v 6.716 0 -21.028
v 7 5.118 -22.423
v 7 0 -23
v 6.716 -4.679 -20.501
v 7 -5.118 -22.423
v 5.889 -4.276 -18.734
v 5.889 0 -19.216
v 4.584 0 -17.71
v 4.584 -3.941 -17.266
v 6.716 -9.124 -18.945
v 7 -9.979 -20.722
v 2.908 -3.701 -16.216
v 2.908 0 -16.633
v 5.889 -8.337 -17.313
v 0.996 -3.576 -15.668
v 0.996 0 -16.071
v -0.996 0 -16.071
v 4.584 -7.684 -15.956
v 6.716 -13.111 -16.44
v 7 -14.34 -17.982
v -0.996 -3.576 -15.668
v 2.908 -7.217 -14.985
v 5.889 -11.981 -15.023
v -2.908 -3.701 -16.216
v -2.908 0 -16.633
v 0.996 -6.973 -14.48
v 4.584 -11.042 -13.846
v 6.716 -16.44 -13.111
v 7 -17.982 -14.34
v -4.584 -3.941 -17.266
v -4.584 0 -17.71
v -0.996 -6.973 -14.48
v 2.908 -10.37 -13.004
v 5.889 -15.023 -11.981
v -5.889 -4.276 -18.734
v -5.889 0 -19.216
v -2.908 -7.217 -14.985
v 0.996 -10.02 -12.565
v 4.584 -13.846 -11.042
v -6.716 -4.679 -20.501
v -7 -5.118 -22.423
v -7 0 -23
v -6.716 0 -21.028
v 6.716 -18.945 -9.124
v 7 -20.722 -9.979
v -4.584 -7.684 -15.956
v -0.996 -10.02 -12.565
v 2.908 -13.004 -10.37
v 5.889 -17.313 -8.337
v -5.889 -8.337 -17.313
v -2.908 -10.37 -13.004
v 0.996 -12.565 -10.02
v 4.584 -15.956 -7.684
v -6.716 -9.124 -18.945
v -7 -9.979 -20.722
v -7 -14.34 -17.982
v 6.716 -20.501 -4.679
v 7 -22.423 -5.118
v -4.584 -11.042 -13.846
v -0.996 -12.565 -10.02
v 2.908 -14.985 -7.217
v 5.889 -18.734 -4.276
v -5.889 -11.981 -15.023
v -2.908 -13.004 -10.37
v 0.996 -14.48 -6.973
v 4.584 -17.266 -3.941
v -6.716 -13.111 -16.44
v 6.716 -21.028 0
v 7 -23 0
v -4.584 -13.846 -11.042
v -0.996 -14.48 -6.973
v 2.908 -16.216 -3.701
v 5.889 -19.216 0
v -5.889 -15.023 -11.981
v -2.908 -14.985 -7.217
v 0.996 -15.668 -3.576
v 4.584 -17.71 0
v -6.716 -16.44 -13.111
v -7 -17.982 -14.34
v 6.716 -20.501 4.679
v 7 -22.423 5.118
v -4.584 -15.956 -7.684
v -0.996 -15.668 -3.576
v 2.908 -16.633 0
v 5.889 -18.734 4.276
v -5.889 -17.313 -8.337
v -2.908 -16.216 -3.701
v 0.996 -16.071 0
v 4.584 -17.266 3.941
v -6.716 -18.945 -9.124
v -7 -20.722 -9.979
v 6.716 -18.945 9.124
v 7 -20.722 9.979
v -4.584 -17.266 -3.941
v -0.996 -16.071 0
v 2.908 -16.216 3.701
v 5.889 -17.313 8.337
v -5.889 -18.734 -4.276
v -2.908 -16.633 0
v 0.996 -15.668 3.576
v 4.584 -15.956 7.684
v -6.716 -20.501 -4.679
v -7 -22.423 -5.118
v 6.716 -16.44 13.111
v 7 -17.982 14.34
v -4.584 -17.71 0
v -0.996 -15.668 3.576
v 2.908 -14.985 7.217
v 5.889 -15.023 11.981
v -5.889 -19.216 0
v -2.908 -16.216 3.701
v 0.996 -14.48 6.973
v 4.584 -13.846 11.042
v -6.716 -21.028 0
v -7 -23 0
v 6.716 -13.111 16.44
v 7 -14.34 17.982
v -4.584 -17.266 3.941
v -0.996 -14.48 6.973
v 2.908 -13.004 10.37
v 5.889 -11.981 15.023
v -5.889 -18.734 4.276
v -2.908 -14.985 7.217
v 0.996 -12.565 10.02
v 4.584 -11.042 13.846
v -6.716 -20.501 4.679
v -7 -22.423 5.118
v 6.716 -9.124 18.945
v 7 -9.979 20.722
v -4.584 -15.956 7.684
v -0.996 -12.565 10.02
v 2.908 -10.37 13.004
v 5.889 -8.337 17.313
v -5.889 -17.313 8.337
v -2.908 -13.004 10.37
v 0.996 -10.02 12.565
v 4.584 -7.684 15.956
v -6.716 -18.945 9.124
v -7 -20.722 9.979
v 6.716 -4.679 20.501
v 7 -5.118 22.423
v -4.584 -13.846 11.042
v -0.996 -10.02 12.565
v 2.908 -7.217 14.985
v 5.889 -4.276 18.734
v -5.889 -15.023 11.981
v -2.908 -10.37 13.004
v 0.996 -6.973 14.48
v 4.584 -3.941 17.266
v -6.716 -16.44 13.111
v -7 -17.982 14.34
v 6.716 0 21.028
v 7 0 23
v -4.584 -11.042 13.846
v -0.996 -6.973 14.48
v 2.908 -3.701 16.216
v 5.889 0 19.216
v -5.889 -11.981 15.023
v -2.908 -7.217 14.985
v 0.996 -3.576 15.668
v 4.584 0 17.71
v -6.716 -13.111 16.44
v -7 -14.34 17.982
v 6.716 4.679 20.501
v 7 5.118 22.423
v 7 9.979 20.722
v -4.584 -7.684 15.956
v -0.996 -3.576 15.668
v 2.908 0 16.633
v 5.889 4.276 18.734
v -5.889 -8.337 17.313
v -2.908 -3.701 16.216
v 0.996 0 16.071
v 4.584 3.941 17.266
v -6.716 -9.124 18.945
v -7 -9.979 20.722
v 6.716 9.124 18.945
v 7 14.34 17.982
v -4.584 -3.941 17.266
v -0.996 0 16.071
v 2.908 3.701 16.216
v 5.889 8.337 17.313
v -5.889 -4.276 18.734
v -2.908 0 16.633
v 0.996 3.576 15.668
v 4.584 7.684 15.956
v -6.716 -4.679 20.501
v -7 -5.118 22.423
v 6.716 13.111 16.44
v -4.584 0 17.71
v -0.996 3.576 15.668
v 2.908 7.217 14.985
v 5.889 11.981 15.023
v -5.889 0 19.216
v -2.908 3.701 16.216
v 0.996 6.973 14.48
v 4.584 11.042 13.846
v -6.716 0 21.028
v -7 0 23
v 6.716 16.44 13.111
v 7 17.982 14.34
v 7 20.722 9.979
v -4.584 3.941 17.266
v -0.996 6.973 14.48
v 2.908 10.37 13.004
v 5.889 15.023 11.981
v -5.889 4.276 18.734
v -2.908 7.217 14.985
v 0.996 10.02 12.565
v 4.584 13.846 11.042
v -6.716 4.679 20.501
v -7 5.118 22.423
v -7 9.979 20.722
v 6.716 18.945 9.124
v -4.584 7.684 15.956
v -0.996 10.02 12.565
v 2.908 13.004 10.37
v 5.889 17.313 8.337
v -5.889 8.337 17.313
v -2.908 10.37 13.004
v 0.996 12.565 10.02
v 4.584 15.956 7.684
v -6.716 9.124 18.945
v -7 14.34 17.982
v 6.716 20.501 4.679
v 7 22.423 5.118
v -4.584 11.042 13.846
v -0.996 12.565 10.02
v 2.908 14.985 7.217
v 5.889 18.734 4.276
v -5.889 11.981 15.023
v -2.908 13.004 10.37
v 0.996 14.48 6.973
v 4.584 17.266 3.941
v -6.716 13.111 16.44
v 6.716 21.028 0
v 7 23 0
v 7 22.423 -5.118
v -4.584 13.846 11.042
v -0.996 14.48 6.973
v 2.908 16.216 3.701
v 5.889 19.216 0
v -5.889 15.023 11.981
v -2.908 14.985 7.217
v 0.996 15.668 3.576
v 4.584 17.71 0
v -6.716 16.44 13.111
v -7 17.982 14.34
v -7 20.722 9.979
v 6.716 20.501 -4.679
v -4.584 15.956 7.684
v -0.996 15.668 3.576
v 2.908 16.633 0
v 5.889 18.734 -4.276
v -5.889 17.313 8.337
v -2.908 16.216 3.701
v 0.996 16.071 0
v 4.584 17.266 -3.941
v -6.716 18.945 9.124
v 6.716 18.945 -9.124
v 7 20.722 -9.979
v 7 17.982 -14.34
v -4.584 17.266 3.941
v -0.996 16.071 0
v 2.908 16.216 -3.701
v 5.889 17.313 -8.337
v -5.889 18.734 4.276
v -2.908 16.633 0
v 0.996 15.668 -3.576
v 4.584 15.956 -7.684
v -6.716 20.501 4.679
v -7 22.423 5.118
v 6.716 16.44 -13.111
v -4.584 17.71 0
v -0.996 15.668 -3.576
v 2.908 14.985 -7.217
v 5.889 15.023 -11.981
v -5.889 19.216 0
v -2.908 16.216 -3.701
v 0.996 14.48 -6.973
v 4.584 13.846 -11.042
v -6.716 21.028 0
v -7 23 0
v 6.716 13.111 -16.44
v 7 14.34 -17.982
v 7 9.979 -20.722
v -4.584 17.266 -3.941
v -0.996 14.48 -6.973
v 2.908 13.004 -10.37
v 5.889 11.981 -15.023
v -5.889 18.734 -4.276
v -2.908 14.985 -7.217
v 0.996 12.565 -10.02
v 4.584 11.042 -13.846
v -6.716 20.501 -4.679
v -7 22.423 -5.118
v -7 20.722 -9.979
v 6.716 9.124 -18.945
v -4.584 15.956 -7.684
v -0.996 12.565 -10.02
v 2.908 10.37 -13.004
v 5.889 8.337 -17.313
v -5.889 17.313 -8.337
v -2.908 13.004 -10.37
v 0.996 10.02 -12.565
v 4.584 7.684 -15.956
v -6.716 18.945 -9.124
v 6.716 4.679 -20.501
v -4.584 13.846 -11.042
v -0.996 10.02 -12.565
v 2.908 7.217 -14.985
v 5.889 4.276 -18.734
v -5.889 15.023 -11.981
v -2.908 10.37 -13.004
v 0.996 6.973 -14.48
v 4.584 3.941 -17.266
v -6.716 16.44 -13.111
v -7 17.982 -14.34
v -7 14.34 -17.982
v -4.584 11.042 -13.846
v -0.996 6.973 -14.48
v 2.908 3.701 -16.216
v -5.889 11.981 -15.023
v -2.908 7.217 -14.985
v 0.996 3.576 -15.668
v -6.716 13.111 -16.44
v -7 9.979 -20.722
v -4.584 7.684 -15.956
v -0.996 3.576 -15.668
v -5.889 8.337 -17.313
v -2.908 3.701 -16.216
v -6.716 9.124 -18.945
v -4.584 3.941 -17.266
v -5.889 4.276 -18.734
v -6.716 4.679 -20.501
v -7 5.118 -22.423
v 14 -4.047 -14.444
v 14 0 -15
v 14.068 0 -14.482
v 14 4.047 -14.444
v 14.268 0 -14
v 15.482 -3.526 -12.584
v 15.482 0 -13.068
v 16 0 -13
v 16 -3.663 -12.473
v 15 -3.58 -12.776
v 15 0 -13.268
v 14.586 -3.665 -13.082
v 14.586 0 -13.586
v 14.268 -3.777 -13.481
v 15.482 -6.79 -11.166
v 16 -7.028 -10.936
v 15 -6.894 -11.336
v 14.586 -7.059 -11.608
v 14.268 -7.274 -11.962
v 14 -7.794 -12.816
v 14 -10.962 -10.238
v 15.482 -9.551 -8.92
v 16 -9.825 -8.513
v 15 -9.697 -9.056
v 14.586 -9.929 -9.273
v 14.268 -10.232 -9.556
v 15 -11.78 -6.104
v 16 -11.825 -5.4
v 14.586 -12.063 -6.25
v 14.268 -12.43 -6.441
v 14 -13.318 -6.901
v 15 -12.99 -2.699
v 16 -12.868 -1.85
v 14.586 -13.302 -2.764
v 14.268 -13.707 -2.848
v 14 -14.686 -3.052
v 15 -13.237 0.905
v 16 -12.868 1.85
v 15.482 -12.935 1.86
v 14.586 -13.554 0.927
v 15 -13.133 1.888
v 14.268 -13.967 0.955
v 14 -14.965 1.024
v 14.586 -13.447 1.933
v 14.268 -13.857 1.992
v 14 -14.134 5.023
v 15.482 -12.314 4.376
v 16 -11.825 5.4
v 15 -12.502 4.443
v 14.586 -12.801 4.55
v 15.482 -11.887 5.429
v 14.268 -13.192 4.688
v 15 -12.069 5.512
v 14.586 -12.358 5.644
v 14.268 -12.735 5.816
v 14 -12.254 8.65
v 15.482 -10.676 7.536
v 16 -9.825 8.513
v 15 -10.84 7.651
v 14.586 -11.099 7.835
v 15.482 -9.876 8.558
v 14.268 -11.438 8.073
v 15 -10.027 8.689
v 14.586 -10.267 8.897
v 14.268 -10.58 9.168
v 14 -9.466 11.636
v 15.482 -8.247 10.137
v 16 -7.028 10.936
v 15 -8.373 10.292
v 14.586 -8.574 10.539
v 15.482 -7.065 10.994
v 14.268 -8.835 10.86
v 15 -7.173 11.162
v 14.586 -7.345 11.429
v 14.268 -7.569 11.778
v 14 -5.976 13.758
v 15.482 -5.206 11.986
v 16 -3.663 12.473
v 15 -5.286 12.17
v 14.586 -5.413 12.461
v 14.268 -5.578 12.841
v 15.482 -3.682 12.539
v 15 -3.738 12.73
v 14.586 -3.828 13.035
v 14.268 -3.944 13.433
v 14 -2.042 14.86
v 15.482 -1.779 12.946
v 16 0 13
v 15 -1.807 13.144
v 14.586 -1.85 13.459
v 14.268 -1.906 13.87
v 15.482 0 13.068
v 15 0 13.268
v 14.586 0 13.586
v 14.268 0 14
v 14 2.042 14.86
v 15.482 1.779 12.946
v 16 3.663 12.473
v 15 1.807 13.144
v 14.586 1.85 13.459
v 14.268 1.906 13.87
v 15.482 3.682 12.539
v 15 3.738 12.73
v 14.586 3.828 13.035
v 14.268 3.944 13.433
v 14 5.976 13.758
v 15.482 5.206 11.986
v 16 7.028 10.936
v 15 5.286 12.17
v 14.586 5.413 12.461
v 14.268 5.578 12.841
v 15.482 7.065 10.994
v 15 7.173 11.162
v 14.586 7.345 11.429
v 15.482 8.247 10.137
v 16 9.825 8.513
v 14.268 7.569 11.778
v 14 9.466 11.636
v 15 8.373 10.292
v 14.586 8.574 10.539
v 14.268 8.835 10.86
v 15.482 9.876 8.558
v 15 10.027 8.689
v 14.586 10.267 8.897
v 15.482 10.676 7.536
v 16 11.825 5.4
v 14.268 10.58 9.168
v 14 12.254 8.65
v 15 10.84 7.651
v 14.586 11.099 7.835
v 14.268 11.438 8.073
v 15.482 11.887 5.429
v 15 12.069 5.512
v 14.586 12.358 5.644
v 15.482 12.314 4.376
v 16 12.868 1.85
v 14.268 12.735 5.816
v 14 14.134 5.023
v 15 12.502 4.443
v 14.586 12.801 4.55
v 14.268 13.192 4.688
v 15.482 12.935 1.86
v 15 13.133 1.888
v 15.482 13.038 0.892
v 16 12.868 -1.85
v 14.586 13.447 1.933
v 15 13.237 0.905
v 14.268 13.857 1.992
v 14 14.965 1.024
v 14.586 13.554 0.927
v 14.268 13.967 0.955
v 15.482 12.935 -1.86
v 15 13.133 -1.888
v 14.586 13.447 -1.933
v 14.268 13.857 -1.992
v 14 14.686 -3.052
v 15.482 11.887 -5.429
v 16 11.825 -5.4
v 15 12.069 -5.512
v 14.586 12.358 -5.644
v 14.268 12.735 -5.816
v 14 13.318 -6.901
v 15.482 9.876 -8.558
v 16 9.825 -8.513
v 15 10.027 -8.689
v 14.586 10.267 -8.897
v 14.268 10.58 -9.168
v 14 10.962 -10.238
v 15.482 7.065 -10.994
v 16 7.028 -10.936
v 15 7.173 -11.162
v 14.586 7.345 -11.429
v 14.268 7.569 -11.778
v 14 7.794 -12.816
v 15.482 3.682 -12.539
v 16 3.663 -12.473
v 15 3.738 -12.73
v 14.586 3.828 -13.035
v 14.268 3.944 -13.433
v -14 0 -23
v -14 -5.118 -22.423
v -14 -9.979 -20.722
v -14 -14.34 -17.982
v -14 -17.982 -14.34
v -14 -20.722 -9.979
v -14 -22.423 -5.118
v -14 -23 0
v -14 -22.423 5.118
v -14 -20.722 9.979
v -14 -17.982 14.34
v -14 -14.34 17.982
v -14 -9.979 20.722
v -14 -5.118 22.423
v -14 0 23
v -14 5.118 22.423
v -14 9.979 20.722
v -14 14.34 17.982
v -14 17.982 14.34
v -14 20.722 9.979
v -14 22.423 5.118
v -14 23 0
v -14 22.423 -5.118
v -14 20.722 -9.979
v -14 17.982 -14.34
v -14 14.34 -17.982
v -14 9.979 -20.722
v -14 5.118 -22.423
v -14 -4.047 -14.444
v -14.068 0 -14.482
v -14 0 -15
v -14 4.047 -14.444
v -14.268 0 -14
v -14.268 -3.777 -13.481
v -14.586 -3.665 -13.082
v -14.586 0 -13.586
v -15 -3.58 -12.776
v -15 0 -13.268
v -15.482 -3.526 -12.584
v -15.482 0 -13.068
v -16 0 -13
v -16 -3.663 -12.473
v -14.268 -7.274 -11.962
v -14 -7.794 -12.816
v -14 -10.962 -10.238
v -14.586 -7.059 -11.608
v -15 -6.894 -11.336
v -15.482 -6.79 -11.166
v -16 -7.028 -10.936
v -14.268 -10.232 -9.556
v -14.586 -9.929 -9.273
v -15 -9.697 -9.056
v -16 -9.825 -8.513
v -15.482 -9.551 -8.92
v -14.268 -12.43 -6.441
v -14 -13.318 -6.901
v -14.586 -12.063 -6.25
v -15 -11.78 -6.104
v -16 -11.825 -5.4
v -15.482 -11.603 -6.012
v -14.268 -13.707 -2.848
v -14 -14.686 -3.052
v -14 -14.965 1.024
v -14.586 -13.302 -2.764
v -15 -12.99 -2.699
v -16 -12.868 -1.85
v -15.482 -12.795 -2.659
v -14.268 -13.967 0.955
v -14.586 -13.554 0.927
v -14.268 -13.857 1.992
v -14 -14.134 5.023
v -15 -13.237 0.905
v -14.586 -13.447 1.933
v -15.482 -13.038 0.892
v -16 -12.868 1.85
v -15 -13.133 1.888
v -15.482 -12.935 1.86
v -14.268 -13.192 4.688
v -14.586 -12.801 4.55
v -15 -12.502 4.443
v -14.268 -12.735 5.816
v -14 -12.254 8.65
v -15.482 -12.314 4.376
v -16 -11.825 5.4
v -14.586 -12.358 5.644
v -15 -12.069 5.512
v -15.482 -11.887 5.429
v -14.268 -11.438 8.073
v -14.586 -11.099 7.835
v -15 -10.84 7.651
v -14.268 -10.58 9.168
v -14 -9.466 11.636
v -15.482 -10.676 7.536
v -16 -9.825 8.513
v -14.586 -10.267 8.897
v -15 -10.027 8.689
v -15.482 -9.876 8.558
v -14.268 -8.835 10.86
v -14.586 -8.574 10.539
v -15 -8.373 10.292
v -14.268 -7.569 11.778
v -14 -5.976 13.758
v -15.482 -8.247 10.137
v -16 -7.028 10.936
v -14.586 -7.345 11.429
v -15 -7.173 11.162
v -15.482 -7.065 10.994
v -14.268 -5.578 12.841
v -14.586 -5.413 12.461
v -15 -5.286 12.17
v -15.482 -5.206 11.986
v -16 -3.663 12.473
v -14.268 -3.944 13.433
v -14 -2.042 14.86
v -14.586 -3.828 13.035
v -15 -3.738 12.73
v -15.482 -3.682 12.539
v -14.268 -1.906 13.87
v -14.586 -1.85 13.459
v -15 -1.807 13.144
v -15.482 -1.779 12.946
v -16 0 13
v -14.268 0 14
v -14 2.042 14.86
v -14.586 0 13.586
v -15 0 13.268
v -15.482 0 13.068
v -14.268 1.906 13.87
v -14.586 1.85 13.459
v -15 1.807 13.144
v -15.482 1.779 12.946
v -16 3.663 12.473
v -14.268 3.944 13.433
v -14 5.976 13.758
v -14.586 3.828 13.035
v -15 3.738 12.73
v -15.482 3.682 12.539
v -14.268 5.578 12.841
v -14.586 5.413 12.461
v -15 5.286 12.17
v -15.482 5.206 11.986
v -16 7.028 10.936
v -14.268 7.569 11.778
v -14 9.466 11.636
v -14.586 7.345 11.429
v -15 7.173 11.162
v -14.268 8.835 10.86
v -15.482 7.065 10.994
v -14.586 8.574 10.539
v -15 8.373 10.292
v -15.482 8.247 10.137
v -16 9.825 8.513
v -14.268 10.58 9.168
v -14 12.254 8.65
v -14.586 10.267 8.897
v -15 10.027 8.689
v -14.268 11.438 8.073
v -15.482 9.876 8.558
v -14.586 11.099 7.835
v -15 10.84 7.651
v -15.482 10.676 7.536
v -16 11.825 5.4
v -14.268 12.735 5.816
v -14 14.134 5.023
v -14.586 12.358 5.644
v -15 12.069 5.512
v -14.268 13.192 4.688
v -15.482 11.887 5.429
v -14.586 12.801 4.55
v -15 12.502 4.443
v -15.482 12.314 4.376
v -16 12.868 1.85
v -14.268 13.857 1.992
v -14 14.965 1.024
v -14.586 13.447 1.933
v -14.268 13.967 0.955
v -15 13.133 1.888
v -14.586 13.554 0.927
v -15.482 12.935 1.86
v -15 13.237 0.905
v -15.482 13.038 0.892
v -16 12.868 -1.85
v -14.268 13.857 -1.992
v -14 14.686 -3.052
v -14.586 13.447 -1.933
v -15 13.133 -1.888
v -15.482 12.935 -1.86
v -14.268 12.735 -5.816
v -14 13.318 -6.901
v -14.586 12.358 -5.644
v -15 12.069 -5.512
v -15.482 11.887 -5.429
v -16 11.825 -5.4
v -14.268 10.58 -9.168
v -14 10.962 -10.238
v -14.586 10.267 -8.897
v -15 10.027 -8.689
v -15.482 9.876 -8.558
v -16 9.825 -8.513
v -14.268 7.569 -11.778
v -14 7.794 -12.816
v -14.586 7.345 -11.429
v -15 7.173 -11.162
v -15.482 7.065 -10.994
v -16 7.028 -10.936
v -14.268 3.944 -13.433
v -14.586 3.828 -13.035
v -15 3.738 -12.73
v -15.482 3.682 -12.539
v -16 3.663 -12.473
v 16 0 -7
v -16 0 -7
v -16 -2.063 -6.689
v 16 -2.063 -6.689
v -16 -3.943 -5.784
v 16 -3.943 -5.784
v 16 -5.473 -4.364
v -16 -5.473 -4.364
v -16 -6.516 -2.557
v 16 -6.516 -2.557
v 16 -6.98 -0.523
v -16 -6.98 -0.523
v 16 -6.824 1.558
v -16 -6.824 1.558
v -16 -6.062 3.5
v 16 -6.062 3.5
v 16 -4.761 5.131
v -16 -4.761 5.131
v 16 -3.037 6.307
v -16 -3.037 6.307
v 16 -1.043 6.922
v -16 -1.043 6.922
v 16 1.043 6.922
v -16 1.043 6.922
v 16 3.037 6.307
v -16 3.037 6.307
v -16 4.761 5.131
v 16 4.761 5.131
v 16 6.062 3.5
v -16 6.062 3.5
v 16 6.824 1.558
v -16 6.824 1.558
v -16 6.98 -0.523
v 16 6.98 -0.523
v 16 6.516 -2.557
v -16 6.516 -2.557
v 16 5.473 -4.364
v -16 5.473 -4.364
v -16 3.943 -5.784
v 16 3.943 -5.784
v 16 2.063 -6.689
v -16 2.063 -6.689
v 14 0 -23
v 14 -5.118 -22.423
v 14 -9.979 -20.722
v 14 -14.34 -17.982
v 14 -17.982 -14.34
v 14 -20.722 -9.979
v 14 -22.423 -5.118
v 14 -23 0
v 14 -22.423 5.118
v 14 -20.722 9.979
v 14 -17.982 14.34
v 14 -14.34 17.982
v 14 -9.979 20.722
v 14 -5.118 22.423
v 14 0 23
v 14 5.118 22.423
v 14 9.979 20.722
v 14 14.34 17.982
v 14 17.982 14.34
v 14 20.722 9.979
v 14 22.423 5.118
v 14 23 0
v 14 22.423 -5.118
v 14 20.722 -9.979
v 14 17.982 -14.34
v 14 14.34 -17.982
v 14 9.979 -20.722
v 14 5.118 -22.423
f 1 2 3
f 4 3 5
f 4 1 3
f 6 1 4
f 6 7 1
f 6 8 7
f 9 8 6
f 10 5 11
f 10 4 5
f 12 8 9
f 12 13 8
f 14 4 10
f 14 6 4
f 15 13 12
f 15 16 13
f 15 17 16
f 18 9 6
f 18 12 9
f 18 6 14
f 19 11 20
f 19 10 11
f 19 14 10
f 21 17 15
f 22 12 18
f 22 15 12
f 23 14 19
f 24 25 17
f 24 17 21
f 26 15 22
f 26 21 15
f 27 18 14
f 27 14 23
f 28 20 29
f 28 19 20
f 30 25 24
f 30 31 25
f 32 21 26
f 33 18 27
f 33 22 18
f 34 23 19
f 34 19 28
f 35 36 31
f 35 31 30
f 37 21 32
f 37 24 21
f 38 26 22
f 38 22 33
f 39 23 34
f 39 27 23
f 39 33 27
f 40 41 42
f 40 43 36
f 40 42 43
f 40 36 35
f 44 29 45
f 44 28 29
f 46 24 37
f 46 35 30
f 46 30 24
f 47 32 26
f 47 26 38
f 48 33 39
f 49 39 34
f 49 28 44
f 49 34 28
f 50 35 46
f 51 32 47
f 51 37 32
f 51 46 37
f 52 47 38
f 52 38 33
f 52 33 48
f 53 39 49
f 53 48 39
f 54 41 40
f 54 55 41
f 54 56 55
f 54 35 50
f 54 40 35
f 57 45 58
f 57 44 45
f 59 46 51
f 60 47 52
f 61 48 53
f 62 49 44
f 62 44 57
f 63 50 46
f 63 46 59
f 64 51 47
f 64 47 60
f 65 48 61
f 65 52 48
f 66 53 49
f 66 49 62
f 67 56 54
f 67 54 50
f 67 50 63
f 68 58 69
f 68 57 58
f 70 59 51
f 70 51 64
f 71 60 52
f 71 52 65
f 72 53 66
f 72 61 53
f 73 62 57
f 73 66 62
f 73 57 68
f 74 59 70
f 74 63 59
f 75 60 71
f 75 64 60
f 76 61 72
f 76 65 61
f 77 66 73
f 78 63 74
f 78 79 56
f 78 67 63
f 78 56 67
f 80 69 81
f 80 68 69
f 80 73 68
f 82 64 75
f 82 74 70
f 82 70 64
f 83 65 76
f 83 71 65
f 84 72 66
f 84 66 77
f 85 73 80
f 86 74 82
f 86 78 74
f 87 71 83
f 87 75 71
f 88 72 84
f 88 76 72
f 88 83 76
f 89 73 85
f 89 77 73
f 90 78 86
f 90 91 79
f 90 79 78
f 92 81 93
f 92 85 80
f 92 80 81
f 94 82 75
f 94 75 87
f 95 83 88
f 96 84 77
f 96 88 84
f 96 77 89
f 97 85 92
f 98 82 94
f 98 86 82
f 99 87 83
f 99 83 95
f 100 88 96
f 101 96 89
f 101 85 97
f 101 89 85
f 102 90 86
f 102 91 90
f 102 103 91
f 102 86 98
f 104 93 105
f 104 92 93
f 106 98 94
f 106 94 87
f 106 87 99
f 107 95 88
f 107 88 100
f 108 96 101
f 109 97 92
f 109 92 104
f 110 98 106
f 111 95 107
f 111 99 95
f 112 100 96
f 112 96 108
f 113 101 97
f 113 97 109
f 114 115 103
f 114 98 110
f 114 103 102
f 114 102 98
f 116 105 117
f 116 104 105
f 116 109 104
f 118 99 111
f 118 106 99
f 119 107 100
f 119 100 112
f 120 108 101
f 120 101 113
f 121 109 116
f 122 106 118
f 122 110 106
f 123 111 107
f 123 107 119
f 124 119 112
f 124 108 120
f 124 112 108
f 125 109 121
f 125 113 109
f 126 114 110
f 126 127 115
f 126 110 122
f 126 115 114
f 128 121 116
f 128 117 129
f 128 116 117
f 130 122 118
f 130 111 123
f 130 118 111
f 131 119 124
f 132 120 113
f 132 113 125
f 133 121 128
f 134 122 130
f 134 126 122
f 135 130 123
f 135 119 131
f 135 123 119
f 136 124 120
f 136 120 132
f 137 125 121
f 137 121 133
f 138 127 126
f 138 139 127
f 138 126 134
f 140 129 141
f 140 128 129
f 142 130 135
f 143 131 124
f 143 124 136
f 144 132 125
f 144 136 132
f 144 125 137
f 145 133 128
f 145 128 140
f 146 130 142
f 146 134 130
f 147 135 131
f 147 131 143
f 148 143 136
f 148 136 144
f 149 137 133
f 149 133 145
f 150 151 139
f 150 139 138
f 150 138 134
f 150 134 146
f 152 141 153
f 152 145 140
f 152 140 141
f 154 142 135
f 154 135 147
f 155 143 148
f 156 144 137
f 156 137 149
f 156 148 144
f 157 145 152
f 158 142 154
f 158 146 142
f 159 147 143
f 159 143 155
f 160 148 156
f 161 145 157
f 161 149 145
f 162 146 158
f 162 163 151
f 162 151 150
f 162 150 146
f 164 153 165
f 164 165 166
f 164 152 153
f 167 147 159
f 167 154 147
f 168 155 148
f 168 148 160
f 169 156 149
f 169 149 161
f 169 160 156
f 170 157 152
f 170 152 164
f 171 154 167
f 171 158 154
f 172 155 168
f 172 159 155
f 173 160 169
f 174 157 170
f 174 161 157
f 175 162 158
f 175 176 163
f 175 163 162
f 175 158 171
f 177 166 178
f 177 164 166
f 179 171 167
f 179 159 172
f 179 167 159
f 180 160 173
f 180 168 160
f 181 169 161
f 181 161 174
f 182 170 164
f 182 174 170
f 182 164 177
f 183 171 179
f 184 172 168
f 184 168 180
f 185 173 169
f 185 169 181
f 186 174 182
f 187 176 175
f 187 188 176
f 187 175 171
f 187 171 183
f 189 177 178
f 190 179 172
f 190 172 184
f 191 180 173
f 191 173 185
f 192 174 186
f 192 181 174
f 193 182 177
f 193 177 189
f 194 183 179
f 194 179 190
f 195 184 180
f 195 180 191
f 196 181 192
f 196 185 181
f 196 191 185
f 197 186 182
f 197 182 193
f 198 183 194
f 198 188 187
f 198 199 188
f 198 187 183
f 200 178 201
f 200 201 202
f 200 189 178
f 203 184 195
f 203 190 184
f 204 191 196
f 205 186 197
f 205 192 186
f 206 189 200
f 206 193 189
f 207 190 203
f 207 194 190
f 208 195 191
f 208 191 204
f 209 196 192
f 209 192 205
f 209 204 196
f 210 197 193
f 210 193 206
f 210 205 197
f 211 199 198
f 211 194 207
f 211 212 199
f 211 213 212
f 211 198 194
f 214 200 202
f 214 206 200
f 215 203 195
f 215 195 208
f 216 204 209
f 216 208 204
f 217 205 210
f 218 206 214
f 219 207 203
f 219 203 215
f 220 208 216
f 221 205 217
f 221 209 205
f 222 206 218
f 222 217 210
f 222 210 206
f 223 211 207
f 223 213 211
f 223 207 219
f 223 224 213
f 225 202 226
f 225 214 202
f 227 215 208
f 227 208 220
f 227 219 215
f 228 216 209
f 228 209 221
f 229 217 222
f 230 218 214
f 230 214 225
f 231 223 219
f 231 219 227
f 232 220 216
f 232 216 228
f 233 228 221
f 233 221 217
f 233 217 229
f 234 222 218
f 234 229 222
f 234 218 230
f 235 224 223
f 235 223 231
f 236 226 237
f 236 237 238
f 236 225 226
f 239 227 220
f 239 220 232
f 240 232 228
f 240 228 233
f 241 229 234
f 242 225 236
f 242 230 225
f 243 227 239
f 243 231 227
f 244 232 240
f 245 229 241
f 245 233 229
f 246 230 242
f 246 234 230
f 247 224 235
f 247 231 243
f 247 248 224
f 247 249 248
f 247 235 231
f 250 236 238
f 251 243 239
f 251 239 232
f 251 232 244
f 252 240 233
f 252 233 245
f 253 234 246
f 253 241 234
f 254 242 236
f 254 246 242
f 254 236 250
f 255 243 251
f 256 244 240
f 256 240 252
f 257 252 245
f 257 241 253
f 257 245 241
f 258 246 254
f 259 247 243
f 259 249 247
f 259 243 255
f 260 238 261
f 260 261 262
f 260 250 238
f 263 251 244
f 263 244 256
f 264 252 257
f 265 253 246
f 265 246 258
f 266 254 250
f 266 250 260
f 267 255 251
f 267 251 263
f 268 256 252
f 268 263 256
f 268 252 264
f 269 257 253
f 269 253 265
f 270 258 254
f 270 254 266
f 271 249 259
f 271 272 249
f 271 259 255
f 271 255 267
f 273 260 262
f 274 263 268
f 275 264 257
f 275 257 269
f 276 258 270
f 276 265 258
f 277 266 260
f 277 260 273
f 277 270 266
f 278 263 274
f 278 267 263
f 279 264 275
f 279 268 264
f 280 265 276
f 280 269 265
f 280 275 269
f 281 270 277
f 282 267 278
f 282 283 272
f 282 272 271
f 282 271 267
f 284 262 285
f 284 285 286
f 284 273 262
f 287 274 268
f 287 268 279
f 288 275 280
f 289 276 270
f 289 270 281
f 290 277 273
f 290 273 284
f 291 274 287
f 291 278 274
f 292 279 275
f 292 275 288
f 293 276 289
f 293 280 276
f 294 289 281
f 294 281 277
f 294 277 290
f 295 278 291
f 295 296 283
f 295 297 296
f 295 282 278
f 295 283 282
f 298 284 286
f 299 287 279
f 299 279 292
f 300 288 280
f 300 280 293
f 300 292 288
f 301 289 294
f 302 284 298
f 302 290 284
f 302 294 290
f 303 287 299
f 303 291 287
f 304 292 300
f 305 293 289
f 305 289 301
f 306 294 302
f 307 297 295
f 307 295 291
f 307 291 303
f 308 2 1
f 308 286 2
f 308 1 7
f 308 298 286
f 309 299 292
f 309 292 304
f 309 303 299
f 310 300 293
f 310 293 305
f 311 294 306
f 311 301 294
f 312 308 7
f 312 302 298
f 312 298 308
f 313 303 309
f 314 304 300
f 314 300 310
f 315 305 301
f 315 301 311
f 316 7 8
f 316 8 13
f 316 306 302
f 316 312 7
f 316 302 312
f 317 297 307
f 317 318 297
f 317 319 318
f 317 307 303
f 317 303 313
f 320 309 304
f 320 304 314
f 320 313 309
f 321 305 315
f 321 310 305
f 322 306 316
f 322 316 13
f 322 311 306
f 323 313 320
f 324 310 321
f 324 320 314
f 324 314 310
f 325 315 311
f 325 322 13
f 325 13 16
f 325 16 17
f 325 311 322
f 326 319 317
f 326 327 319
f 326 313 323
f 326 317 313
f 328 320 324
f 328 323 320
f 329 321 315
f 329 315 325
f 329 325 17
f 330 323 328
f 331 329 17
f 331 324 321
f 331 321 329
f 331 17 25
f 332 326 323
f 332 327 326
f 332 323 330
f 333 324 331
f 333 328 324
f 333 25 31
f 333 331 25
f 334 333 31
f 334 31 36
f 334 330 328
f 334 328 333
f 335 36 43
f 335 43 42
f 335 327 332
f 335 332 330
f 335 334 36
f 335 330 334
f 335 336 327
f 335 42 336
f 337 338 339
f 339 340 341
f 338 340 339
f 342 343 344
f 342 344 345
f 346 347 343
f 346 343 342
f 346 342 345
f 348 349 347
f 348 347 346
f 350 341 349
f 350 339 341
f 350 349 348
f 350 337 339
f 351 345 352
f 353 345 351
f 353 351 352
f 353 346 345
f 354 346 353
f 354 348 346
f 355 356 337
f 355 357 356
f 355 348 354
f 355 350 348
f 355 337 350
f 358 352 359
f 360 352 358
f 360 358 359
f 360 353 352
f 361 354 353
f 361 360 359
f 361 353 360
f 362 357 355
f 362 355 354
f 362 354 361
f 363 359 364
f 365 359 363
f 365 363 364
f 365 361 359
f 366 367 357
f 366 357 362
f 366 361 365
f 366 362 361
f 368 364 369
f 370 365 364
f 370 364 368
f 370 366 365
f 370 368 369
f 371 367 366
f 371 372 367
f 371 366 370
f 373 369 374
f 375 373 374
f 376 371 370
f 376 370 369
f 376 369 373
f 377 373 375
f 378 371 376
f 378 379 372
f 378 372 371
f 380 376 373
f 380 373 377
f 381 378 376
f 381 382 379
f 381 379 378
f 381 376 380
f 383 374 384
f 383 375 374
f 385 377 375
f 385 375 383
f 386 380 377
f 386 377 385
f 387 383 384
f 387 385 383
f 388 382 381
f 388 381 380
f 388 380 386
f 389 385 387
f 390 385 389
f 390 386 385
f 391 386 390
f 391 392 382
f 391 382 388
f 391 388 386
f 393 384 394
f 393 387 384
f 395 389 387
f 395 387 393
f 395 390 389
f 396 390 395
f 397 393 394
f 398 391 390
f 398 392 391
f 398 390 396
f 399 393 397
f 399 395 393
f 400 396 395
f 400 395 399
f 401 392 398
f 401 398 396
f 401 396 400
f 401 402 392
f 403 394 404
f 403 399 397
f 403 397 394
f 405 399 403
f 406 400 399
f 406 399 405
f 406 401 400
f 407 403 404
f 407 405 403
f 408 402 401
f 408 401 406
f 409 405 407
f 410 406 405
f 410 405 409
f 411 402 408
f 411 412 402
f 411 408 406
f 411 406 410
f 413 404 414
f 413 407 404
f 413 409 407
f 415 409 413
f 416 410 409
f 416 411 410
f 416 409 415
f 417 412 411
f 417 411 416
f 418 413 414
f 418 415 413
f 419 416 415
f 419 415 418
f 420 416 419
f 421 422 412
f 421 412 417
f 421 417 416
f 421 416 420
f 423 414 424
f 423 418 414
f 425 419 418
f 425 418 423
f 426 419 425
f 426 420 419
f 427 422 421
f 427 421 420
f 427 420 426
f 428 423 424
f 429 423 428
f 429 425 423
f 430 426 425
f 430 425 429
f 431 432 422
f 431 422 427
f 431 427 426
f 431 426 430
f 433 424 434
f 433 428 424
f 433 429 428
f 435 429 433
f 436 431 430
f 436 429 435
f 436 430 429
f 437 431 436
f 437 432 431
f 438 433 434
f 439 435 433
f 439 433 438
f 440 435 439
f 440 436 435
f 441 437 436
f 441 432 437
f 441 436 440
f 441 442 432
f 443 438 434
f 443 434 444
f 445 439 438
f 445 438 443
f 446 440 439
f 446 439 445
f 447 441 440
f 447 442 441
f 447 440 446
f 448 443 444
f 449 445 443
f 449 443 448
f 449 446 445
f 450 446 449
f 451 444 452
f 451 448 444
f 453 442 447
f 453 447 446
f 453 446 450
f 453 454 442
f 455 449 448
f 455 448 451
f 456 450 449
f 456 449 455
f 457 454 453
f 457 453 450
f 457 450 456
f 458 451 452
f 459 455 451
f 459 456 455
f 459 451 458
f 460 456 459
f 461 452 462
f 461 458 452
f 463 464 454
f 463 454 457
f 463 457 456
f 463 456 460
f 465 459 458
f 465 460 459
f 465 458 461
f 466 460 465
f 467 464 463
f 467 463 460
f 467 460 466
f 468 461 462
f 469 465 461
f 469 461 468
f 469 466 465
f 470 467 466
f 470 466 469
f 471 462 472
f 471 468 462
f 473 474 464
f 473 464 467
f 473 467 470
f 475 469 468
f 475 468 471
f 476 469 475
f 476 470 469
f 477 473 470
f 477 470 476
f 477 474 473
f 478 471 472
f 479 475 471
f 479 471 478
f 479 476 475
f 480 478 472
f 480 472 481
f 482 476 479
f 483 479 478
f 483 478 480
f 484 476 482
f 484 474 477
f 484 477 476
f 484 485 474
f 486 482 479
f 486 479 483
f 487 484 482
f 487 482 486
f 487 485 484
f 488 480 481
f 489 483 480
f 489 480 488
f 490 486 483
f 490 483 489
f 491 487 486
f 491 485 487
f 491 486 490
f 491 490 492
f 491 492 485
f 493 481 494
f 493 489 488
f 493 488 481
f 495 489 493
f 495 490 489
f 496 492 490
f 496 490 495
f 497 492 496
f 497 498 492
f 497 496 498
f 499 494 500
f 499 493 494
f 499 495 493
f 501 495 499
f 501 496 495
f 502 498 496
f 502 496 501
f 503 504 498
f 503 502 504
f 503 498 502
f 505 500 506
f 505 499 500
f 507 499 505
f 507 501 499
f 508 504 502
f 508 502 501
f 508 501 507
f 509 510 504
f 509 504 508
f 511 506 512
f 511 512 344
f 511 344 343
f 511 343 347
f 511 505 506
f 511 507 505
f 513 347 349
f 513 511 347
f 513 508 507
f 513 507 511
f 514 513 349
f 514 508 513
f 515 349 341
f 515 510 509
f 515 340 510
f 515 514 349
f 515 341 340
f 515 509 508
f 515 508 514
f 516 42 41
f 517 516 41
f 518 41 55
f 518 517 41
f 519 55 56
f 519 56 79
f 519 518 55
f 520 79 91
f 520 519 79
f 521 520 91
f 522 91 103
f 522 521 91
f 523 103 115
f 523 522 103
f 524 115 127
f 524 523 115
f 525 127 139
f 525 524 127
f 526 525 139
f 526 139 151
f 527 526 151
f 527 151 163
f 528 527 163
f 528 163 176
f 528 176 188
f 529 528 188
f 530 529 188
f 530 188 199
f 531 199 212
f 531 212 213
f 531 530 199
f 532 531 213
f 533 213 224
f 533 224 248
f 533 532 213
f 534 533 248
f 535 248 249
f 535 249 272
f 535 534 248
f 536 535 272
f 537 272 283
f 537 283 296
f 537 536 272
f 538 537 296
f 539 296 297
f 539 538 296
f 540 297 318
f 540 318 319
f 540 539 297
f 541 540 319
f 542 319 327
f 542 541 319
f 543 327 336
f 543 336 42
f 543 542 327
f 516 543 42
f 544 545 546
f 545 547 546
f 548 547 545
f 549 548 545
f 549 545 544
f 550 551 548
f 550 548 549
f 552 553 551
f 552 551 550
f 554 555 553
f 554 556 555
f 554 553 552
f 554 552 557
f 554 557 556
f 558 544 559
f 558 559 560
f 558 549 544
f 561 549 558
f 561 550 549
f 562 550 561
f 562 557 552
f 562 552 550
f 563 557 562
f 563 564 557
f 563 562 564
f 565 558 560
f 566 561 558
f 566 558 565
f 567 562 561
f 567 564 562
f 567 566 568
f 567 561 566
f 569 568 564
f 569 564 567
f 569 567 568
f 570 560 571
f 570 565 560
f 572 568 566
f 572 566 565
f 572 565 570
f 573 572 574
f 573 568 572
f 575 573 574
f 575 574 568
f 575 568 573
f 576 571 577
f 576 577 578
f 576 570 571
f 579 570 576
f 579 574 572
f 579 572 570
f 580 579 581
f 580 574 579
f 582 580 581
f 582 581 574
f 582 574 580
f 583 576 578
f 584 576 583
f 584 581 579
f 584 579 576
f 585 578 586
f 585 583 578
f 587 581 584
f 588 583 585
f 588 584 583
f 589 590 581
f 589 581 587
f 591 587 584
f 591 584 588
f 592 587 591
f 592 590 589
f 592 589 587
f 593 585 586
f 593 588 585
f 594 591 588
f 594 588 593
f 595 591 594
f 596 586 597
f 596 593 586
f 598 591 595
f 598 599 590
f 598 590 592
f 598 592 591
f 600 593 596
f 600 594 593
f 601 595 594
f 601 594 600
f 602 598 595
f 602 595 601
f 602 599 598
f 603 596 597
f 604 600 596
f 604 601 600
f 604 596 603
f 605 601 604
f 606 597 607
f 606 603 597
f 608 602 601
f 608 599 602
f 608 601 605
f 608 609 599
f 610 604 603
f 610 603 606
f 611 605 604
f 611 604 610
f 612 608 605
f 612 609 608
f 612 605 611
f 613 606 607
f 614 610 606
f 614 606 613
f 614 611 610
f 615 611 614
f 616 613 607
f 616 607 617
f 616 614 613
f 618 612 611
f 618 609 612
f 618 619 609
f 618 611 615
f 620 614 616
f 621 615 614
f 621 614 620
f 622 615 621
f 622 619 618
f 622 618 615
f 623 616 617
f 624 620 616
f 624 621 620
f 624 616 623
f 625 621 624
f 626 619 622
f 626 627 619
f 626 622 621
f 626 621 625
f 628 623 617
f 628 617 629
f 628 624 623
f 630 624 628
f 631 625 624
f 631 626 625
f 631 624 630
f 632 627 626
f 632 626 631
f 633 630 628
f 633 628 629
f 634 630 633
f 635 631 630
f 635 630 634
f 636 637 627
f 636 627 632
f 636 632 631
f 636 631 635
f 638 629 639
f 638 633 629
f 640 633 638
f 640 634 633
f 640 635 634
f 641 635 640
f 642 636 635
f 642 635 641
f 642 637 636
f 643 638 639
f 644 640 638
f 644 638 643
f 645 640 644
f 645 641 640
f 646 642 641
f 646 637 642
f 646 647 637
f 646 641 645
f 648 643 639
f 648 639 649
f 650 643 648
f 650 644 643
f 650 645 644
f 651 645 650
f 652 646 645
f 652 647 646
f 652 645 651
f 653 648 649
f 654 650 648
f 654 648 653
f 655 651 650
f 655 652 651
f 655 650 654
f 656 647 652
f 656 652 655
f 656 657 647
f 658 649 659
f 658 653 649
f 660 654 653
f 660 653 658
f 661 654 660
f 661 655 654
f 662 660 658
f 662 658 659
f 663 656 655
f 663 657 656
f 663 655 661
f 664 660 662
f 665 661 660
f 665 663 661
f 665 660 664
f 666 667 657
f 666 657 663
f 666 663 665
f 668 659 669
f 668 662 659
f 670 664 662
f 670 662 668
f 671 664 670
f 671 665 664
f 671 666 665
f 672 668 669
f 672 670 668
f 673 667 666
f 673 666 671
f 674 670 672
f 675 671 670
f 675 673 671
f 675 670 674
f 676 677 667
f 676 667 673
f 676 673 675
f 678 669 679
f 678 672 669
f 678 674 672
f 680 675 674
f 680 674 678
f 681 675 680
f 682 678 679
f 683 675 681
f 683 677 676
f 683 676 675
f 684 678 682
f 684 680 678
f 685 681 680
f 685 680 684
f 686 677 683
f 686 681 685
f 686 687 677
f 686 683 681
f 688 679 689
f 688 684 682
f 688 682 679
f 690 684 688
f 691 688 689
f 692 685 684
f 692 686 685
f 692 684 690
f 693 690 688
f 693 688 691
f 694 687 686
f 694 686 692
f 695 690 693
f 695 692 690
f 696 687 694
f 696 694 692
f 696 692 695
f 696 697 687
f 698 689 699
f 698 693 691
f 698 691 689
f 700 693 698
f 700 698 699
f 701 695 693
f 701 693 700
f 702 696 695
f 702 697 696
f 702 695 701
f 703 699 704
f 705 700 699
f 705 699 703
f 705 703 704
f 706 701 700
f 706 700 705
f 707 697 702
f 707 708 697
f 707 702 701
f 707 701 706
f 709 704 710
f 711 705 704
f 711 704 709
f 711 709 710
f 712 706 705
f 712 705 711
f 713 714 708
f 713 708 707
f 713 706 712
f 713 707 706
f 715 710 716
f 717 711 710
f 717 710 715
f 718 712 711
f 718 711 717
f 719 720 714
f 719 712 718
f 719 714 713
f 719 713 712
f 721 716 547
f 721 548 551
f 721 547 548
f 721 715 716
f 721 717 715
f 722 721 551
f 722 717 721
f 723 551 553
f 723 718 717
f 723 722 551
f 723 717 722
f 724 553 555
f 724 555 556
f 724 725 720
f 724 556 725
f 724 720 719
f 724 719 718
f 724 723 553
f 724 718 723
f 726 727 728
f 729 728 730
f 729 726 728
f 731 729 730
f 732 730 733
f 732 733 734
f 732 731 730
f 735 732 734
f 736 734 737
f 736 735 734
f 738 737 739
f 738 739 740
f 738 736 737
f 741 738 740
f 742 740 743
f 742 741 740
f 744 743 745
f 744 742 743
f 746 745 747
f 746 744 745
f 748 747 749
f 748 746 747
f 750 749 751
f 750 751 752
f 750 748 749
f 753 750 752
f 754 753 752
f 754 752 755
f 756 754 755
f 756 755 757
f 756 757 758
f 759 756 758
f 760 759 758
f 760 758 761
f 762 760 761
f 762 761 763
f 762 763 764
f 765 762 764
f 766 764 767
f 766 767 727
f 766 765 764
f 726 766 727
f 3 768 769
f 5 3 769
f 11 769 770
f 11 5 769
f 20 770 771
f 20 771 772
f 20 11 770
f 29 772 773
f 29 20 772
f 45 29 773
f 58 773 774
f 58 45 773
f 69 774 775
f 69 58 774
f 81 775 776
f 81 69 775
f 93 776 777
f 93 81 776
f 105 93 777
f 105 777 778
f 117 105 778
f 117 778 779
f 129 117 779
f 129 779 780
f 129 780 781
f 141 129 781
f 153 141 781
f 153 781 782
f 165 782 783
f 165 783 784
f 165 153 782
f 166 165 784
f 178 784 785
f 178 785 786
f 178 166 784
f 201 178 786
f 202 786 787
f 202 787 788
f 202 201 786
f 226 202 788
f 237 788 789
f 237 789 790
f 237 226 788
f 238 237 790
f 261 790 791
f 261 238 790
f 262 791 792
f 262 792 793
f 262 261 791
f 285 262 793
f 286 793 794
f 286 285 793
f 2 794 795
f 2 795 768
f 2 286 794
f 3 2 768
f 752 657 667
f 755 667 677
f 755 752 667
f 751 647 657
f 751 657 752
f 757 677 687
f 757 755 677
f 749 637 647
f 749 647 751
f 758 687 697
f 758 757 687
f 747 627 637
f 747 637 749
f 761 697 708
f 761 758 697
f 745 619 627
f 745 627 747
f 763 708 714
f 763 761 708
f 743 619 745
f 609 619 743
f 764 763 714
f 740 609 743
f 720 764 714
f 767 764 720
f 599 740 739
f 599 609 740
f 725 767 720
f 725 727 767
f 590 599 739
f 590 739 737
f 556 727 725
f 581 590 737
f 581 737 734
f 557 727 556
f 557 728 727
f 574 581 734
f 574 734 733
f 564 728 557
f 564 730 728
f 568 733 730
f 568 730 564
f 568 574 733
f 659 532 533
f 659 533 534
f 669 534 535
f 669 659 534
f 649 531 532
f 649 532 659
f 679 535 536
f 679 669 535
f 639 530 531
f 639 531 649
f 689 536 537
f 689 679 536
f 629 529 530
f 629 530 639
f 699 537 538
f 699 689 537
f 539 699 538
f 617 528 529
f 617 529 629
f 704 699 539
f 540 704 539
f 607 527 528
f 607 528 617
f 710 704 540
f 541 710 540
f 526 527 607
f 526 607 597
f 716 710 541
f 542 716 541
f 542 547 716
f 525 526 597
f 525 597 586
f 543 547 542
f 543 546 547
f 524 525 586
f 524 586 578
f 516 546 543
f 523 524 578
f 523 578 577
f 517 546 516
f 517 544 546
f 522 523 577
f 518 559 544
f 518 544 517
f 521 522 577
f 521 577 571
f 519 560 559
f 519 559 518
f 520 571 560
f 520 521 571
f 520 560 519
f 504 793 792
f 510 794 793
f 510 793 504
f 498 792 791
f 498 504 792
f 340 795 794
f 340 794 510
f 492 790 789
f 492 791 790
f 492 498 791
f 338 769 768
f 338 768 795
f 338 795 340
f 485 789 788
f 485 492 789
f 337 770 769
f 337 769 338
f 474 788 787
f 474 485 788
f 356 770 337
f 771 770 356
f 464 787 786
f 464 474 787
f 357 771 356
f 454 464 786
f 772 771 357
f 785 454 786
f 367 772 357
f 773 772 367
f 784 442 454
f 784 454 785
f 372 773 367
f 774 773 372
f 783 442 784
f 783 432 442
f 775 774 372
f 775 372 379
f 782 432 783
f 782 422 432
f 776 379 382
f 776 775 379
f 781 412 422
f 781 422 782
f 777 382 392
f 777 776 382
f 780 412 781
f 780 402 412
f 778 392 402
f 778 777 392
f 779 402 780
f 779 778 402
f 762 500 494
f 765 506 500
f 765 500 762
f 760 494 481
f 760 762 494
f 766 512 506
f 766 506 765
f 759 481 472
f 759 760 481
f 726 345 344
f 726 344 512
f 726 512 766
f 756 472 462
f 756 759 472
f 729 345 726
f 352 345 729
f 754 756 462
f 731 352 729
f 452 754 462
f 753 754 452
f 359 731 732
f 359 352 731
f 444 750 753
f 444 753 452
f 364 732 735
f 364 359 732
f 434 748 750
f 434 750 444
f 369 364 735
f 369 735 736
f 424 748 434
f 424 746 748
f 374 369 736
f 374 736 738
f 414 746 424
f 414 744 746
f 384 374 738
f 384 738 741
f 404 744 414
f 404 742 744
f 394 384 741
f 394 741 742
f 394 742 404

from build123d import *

# Parameters (mm, degrees)
FILLET1_R = 2


with BuildPart() as part:
    # Sketch1 → Revolve1 (revolve)
    with BuildSketch(Plane.XY, mode=Mode.PRIVATE) as revolve1_sk:
        with BuildLine():
            Line((-16, 7), (16, 7))
            Line((16, 7), (16, 13))
            Line((16, 13), (14, 13))
            Line((14, 13), (14, 23))
            Line((14, 23), (7, 23))
            ThreePointArc((7, 23), (0, 16), (-7, 23))
            Line((-7, 23), (-14, 23))
            Line((-14, 23), (-14, 13))
            Line((-14, 13), (-16, 13))
            Line((-16, 13), (-16, 7))
        make_face()
    revolve(revolve1_sk.sketch.rotate(Axis((0, 0, 0), (-1, 0, 0)), 90), axis=Axis((0, 0, 0), (-1, 0, 0)))

    # Fillet1
    fillet1_edges = [part.edges().sort_by_distance(p)[0] for p in [
        (-14, 0, 13),
        (14, 0, 13),
    ]]
    fillet(fillet1_edges, radius=FILLET1_R - 0.0001)  # a hair under: the kernel refuses the full size


solid = part.part
